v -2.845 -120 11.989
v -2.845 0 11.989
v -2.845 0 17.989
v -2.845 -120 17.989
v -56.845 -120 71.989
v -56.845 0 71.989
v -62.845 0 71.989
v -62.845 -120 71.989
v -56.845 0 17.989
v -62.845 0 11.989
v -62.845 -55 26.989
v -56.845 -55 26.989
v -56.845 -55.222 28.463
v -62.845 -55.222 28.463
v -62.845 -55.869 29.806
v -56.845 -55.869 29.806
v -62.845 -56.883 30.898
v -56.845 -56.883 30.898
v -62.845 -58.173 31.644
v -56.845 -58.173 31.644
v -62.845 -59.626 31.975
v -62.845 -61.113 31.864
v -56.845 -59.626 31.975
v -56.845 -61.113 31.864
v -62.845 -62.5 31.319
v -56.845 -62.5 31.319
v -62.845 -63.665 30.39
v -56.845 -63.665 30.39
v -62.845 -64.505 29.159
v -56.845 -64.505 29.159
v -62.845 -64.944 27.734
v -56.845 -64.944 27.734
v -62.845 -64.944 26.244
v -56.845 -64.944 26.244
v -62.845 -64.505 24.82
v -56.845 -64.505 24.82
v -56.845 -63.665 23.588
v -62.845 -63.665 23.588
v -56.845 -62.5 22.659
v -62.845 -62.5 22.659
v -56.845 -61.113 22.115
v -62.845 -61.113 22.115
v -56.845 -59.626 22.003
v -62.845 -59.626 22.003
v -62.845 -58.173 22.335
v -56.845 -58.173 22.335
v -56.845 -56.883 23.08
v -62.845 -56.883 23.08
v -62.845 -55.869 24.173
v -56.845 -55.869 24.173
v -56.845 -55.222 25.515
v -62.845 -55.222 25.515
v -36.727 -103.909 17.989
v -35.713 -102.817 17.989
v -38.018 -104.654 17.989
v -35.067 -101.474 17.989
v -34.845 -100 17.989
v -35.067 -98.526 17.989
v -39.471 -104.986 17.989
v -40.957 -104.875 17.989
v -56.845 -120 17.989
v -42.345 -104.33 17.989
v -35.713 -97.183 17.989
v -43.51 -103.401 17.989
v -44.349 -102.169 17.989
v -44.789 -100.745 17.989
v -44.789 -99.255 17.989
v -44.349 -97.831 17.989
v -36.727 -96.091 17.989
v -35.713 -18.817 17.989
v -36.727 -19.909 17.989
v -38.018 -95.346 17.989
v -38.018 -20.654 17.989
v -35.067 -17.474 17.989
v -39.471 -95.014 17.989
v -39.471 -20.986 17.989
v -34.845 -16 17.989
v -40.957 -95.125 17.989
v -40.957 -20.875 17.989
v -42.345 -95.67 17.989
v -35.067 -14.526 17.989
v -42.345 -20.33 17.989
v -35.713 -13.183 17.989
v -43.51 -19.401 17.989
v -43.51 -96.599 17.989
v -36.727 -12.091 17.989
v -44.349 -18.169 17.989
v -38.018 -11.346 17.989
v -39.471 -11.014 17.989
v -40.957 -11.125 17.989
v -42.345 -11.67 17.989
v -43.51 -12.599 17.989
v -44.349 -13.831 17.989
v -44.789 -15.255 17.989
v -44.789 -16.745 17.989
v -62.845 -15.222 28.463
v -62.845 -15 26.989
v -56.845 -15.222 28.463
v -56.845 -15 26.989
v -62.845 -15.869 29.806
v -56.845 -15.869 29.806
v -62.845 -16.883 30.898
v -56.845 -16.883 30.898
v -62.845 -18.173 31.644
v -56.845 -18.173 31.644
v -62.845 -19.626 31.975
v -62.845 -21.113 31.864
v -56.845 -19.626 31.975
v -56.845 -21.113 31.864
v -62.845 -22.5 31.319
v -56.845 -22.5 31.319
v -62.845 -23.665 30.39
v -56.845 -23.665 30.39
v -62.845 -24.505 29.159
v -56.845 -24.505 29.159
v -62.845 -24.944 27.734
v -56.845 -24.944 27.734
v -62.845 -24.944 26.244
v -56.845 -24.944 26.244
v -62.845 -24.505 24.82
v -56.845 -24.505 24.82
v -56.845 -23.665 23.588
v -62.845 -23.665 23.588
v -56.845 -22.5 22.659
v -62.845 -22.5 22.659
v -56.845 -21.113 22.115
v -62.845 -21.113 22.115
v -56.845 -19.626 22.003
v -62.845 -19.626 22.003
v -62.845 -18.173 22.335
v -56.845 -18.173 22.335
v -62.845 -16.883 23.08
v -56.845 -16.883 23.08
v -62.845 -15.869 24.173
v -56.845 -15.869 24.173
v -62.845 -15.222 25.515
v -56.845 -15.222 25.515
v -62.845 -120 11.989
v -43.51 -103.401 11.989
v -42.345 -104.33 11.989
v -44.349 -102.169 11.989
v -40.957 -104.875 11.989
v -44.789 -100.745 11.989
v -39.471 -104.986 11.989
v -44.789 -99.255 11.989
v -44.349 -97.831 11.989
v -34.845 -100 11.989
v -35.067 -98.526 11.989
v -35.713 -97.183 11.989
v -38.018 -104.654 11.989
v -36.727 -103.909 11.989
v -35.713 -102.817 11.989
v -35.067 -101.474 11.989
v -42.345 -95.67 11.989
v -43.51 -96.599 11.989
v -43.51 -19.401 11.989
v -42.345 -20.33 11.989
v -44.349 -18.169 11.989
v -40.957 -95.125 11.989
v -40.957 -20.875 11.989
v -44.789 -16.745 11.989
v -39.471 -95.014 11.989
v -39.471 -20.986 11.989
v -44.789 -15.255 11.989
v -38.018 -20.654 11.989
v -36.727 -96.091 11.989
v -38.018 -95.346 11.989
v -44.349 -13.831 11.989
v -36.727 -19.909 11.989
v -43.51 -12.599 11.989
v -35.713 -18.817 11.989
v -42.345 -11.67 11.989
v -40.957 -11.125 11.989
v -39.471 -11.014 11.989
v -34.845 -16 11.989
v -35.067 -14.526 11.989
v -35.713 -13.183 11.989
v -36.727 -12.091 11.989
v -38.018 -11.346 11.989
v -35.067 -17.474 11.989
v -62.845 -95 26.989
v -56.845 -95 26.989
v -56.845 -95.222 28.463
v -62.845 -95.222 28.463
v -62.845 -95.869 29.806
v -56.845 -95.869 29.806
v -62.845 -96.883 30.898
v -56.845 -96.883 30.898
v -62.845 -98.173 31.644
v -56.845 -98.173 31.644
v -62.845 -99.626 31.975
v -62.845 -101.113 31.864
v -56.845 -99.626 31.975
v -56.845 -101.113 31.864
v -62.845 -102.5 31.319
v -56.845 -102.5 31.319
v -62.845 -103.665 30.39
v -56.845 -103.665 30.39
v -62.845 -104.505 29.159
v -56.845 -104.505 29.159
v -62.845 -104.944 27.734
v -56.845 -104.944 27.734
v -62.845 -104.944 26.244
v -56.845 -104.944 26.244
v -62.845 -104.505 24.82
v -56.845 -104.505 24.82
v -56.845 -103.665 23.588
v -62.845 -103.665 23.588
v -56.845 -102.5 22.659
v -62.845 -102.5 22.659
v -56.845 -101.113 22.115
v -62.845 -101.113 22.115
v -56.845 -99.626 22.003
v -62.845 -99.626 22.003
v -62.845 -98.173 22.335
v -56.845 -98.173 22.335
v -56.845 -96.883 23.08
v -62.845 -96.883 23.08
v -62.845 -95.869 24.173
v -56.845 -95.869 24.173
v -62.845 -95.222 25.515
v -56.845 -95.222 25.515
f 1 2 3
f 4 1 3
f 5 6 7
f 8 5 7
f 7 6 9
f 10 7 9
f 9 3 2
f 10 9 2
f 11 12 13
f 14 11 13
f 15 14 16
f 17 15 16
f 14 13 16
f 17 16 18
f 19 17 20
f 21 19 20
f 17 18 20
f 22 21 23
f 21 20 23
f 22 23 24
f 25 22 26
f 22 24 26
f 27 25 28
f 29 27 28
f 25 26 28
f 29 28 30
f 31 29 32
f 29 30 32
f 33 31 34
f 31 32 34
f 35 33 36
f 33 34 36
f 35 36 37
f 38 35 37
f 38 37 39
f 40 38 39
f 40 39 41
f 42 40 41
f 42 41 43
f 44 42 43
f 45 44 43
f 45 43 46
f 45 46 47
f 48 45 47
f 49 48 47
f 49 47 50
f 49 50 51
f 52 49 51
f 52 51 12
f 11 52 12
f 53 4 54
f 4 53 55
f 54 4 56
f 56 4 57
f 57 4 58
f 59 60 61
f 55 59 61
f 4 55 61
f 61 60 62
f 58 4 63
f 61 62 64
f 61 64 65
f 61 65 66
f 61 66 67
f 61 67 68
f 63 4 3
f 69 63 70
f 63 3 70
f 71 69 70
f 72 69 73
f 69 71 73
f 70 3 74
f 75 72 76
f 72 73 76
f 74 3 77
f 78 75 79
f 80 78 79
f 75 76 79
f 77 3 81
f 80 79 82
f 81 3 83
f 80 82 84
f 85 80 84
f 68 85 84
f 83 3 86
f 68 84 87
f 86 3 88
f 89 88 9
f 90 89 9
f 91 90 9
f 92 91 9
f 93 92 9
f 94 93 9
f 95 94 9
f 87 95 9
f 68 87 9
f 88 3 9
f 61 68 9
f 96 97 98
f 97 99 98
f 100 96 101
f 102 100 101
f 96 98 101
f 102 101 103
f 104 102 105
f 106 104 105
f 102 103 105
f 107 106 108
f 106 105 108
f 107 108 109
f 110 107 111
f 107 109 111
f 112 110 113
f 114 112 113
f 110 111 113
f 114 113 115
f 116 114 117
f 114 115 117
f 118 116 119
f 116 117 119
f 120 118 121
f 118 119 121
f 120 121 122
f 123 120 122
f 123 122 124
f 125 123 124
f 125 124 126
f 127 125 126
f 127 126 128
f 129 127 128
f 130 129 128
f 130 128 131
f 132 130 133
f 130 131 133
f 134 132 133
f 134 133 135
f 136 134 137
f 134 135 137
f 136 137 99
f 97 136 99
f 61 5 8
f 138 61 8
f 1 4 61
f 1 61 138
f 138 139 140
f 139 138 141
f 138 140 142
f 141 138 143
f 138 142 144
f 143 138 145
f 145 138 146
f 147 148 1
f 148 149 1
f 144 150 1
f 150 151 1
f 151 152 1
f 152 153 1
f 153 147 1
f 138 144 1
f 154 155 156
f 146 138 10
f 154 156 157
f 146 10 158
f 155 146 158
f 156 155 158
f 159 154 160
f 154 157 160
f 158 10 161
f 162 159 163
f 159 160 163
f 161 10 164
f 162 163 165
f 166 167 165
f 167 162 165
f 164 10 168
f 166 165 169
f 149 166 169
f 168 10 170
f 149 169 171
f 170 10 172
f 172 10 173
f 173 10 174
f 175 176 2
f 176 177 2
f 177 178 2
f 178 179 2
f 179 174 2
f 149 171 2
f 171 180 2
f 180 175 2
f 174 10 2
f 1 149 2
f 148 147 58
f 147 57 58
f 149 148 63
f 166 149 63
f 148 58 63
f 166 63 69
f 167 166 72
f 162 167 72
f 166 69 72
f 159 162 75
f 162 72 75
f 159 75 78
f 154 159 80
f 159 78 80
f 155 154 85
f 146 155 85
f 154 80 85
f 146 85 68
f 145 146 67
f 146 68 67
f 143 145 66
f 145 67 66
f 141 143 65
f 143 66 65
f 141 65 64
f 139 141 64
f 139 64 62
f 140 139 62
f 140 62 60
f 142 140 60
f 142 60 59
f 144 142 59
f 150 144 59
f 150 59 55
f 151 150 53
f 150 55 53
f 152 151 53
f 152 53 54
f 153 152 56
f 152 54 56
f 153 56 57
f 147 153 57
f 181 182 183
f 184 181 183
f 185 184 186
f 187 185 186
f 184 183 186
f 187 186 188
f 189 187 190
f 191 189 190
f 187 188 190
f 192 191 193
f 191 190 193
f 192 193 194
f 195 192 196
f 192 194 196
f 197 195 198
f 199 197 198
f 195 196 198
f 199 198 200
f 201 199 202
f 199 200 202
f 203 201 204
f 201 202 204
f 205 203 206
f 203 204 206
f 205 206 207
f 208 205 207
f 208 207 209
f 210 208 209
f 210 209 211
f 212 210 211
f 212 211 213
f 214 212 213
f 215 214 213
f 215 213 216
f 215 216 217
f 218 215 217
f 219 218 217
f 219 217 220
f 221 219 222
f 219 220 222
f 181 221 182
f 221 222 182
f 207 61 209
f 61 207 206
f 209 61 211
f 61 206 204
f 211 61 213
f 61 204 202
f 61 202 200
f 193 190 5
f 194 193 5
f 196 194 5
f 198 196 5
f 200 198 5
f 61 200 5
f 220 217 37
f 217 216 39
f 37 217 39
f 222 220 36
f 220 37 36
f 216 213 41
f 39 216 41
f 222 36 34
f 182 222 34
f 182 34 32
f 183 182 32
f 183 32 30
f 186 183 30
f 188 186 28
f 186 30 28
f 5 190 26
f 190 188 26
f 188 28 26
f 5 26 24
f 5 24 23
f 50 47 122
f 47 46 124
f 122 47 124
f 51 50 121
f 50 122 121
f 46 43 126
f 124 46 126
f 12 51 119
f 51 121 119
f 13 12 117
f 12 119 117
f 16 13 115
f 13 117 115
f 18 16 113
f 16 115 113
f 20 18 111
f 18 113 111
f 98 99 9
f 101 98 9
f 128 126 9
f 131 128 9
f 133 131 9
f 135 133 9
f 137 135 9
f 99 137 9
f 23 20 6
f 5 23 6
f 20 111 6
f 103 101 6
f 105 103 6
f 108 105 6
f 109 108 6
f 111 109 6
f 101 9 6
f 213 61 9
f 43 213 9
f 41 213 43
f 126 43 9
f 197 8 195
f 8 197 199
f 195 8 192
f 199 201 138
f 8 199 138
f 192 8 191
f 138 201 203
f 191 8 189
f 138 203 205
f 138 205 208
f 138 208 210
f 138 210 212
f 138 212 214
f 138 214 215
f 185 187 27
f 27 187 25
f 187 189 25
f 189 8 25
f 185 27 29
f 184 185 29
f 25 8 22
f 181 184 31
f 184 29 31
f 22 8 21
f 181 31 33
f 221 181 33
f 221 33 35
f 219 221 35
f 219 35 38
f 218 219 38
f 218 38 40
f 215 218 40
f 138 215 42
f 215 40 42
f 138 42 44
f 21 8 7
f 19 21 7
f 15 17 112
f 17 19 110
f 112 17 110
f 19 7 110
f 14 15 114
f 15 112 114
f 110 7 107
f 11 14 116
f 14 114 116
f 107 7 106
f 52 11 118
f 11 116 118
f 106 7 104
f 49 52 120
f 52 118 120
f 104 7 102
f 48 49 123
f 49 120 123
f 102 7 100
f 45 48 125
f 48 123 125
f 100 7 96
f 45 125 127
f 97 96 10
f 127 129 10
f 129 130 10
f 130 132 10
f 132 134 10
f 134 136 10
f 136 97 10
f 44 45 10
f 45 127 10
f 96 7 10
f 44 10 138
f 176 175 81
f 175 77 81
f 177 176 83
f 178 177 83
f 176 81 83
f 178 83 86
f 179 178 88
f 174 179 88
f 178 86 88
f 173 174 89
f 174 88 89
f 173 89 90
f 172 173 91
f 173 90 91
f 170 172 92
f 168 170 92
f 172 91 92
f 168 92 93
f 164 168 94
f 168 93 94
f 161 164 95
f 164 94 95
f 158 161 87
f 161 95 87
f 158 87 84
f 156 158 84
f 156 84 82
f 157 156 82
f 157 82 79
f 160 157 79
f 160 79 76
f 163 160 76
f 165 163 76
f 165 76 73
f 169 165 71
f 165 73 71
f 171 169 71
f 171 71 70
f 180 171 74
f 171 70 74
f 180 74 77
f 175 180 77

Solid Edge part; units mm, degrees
sketch "Sketch1" plane through (0, 0, 0) normal (0, -1, 0) x (1, 0, 0)
  line L0 (-56.8446, 11.9892) -> (-2.8446, 11.9892)
  line L1 (-2.8446, 11.9892) -> (-2.8446, 17.9892)
  line L2 (-2.8446, 17.9892) -> (-56.8446, 17.9892)
  line L3 (-56.8446, 17.9892) -> (-56.8446, 11.9892)
  line L4 (-62.8446, 11.9892) -> (-56.8446, 11.9892)
  line L5 (-56.8446, 11.9892) -> (-56.8446, 71.9892)
  line L6 (-56.8446, 71.9892) -> (-62.8446, 71.9892)
  line L7 (-62.8446, 71.9892) -> (-62.8446, 11.9892)
  dimension "D1" = 60
  dimension "D2" = 6
  dimension "D3" = 6
  dimension "D4" = 60
extrude "Protrusion1" add sketch "Sketch1" along normal blind 120
sketch "Sketch2" plane through (-56.8446, -75, 44.9892) normal (1, 0, 0) x (0, 1, 0)
  circle A0 centre (55, -18) radius 5
  circle A1 centre (-25, -18) radius 5
  circle A2 centre (15, -18) radius 5
  dimension "D1" = 10
  dimension "D2" = 40
  dimension "D3" = 15
  dimension "D4" = 20
  dimension "D5" = 10
  dimension "D6" = 40
extrude "ExtrudedCutout_1" cut sketch "Sketch2" against normal blind 21.8402
sketch "Sketch3" plane through (-29.8446, -75, 17.9892) normal (0, 0, 1) x (1, 0, 0)
  circle A0 centre (-10, -25) radius 5
  circle A1 centre (-10, 59) radius 5
  dimension "D1" = 10
  dimension "D2" = 104
  dimension "D3" = 20
extrude "ExtrudedCutout_2" cut sketch "Sketch3" against normal blind 26.4448
properties material "Aluminum, 6061-T6"
